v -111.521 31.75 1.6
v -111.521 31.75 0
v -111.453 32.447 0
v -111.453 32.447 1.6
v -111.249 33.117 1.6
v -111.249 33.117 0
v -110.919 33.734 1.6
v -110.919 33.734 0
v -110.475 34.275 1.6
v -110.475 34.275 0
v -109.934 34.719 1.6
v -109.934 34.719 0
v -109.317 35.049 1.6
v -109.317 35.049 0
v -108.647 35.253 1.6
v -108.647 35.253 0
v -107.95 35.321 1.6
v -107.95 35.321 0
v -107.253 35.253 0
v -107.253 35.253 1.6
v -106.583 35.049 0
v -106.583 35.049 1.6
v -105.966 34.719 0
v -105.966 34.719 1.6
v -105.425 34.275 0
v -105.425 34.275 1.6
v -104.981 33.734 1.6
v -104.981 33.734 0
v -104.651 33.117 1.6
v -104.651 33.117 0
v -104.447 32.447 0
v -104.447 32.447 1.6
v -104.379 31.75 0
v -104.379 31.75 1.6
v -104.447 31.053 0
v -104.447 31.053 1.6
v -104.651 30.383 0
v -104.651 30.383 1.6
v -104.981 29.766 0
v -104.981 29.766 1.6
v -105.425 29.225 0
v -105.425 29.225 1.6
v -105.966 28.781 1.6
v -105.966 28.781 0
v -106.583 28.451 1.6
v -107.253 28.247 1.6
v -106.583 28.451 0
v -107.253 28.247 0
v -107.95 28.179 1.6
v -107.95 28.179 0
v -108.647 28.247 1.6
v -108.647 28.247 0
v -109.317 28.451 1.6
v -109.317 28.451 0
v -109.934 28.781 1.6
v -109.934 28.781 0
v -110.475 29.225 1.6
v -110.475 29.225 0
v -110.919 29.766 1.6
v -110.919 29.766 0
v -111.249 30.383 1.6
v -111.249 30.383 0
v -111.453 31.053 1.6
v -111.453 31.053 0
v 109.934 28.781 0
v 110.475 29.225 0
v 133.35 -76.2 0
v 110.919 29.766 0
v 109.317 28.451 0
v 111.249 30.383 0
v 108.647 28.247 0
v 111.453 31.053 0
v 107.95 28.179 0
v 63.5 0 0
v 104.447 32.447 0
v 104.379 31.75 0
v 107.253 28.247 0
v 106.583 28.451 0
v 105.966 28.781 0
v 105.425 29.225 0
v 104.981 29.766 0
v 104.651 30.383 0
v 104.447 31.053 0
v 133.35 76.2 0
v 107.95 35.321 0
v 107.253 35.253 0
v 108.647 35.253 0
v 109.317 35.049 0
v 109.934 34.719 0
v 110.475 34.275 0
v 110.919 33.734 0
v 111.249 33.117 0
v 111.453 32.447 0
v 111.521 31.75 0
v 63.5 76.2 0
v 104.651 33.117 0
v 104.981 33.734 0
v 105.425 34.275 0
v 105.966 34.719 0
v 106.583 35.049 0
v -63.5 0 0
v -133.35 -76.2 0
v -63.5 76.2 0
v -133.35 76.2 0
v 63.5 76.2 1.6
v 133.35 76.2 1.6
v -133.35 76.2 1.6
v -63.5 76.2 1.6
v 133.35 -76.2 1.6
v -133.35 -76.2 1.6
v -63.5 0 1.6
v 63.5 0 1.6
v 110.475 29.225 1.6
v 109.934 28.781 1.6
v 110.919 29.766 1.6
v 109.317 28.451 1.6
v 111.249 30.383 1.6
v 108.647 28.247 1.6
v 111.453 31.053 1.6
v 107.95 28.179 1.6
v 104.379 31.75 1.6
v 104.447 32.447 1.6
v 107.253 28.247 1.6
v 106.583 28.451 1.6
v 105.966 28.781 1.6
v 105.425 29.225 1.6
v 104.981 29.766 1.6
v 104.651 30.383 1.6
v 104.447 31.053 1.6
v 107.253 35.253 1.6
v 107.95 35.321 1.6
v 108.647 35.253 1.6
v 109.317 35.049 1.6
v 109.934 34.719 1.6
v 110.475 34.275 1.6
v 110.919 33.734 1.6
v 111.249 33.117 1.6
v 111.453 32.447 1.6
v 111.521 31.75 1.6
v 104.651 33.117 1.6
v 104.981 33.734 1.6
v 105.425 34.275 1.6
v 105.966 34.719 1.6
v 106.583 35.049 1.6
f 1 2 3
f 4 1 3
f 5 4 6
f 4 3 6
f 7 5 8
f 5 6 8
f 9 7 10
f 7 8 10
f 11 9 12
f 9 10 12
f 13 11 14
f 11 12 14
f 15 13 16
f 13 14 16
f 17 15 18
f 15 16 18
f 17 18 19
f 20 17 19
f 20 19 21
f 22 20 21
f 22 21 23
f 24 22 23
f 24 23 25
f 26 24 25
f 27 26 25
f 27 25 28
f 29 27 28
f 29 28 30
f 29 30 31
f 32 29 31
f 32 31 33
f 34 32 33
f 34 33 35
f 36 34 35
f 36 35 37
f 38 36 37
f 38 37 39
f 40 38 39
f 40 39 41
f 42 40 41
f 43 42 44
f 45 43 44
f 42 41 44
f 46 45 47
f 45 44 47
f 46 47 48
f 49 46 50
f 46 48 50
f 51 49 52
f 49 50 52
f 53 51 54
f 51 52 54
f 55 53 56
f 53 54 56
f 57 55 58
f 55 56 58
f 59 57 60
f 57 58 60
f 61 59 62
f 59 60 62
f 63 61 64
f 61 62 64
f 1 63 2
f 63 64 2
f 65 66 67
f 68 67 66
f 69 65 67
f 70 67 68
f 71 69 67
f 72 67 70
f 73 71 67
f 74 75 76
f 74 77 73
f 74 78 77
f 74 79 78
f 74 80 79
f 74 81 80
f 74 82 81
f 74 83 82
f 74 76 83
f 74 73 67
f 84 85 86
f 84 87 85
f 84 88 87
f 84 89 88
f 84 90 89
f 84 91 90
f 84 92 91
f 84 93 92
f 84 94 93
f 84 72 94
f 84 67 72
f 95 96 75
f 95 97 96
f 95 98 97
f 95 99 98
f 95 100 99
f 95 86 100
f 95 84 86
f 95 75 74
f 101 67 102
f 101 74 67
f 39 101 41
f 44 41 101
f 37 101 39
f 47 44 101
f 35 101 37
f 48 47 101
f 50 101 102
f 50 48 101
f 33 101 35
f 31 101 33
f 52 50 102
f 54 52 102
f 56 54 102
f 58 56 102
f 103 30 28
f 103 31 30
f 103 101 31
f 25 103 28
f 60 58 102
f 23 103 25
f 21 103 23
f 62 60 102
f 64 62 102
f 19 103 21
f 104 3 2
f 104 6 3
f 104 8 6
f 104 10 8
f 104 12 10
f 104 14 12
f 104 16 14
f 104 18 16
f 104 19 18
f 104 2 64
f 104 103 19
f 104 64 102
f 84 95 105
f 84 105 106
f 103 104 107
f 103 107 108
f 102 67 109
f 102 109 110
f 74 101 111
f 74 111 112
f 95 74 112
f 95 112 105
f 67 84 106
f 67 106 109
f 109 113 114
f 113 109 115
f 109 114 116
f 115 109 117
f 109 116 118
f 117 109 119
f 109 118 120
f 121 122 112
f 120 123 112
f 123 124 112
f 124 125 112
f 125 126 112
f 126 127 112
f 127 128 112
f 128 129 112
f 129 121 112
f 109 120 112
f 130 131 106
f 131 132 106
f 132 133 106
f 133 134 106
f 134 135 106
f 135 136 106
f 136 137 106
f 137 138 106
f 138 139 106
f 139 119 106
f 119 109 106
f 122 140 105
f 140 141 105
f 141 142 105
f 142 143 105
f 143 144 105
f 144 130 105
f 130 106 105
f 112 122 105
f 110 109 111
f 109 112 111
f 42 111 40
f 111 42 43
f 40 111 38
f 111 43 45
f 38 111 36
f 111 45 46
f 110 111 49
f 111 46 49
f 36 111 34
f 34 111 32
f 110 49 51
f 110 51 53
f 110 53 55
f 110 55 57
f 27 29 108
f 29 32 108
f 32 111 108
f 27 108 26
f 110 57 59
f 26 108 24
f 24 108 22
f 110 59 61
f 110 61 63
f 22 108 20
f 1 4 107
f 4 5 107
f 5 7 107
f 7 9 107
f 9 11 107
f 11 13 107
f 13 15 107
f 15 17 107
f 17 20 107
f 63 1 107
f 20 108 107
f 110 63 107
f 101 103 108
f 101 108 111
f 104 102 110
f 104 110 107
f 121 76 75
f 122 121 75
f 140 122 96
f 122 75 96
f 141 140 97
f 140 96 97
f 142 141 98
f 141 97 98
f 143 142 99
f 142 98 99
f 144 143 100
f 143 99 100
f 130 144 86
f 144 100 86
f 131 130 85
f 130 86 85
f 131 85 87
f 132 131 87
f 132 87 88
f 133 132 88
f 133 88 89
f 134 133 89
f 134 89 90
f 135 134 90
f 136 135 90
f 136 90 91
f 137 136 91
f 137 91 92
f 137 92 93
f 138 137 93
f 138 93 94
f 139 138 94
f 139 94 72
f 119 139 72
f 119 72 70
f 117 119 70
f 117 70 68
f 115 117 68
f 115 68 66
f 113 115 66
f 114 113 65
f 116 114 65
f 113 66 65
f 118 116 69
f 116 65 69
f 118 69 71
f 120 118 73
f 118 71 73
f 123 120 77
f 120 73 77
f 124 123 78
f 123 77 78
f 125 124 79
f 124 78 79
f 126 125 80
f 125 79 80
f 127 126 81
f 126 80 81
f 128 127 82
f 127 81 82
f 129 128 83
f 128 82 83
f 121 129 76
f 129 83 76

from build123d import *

# Parameters (mm, degrees)
BOSS_EXTRUDE1_DEPTH     = 1.6002
F_1_4_CLEARANCE_HOLE1_D = 7.14248


with BuildPart() as part:
    # Sketch1 → Boss-Extrude1 (new body)
    with BuildSketch(Plane.XY):
        Polygon((63.5, 76.2), (133.35, 76.2), (133.35, -76.2), (-133.35, -76.2), (-133.35, 76.2), (-63.5, 76.2), (-63.5, 0), (63.5, 0), align=None)
    extrude(amount=BOSS_EXTRUDE1_DEPTH)

    # 1/4 Clearance Hole1 (through all)
    with Locations(Plane.XY.offset(1.6002)):
        with Locations((-107.95, 31.75), (107.95, 31.75)):
            Hole(F_1_4_CLEARANCE_HOLE1_D / 2)


solid = part.part
